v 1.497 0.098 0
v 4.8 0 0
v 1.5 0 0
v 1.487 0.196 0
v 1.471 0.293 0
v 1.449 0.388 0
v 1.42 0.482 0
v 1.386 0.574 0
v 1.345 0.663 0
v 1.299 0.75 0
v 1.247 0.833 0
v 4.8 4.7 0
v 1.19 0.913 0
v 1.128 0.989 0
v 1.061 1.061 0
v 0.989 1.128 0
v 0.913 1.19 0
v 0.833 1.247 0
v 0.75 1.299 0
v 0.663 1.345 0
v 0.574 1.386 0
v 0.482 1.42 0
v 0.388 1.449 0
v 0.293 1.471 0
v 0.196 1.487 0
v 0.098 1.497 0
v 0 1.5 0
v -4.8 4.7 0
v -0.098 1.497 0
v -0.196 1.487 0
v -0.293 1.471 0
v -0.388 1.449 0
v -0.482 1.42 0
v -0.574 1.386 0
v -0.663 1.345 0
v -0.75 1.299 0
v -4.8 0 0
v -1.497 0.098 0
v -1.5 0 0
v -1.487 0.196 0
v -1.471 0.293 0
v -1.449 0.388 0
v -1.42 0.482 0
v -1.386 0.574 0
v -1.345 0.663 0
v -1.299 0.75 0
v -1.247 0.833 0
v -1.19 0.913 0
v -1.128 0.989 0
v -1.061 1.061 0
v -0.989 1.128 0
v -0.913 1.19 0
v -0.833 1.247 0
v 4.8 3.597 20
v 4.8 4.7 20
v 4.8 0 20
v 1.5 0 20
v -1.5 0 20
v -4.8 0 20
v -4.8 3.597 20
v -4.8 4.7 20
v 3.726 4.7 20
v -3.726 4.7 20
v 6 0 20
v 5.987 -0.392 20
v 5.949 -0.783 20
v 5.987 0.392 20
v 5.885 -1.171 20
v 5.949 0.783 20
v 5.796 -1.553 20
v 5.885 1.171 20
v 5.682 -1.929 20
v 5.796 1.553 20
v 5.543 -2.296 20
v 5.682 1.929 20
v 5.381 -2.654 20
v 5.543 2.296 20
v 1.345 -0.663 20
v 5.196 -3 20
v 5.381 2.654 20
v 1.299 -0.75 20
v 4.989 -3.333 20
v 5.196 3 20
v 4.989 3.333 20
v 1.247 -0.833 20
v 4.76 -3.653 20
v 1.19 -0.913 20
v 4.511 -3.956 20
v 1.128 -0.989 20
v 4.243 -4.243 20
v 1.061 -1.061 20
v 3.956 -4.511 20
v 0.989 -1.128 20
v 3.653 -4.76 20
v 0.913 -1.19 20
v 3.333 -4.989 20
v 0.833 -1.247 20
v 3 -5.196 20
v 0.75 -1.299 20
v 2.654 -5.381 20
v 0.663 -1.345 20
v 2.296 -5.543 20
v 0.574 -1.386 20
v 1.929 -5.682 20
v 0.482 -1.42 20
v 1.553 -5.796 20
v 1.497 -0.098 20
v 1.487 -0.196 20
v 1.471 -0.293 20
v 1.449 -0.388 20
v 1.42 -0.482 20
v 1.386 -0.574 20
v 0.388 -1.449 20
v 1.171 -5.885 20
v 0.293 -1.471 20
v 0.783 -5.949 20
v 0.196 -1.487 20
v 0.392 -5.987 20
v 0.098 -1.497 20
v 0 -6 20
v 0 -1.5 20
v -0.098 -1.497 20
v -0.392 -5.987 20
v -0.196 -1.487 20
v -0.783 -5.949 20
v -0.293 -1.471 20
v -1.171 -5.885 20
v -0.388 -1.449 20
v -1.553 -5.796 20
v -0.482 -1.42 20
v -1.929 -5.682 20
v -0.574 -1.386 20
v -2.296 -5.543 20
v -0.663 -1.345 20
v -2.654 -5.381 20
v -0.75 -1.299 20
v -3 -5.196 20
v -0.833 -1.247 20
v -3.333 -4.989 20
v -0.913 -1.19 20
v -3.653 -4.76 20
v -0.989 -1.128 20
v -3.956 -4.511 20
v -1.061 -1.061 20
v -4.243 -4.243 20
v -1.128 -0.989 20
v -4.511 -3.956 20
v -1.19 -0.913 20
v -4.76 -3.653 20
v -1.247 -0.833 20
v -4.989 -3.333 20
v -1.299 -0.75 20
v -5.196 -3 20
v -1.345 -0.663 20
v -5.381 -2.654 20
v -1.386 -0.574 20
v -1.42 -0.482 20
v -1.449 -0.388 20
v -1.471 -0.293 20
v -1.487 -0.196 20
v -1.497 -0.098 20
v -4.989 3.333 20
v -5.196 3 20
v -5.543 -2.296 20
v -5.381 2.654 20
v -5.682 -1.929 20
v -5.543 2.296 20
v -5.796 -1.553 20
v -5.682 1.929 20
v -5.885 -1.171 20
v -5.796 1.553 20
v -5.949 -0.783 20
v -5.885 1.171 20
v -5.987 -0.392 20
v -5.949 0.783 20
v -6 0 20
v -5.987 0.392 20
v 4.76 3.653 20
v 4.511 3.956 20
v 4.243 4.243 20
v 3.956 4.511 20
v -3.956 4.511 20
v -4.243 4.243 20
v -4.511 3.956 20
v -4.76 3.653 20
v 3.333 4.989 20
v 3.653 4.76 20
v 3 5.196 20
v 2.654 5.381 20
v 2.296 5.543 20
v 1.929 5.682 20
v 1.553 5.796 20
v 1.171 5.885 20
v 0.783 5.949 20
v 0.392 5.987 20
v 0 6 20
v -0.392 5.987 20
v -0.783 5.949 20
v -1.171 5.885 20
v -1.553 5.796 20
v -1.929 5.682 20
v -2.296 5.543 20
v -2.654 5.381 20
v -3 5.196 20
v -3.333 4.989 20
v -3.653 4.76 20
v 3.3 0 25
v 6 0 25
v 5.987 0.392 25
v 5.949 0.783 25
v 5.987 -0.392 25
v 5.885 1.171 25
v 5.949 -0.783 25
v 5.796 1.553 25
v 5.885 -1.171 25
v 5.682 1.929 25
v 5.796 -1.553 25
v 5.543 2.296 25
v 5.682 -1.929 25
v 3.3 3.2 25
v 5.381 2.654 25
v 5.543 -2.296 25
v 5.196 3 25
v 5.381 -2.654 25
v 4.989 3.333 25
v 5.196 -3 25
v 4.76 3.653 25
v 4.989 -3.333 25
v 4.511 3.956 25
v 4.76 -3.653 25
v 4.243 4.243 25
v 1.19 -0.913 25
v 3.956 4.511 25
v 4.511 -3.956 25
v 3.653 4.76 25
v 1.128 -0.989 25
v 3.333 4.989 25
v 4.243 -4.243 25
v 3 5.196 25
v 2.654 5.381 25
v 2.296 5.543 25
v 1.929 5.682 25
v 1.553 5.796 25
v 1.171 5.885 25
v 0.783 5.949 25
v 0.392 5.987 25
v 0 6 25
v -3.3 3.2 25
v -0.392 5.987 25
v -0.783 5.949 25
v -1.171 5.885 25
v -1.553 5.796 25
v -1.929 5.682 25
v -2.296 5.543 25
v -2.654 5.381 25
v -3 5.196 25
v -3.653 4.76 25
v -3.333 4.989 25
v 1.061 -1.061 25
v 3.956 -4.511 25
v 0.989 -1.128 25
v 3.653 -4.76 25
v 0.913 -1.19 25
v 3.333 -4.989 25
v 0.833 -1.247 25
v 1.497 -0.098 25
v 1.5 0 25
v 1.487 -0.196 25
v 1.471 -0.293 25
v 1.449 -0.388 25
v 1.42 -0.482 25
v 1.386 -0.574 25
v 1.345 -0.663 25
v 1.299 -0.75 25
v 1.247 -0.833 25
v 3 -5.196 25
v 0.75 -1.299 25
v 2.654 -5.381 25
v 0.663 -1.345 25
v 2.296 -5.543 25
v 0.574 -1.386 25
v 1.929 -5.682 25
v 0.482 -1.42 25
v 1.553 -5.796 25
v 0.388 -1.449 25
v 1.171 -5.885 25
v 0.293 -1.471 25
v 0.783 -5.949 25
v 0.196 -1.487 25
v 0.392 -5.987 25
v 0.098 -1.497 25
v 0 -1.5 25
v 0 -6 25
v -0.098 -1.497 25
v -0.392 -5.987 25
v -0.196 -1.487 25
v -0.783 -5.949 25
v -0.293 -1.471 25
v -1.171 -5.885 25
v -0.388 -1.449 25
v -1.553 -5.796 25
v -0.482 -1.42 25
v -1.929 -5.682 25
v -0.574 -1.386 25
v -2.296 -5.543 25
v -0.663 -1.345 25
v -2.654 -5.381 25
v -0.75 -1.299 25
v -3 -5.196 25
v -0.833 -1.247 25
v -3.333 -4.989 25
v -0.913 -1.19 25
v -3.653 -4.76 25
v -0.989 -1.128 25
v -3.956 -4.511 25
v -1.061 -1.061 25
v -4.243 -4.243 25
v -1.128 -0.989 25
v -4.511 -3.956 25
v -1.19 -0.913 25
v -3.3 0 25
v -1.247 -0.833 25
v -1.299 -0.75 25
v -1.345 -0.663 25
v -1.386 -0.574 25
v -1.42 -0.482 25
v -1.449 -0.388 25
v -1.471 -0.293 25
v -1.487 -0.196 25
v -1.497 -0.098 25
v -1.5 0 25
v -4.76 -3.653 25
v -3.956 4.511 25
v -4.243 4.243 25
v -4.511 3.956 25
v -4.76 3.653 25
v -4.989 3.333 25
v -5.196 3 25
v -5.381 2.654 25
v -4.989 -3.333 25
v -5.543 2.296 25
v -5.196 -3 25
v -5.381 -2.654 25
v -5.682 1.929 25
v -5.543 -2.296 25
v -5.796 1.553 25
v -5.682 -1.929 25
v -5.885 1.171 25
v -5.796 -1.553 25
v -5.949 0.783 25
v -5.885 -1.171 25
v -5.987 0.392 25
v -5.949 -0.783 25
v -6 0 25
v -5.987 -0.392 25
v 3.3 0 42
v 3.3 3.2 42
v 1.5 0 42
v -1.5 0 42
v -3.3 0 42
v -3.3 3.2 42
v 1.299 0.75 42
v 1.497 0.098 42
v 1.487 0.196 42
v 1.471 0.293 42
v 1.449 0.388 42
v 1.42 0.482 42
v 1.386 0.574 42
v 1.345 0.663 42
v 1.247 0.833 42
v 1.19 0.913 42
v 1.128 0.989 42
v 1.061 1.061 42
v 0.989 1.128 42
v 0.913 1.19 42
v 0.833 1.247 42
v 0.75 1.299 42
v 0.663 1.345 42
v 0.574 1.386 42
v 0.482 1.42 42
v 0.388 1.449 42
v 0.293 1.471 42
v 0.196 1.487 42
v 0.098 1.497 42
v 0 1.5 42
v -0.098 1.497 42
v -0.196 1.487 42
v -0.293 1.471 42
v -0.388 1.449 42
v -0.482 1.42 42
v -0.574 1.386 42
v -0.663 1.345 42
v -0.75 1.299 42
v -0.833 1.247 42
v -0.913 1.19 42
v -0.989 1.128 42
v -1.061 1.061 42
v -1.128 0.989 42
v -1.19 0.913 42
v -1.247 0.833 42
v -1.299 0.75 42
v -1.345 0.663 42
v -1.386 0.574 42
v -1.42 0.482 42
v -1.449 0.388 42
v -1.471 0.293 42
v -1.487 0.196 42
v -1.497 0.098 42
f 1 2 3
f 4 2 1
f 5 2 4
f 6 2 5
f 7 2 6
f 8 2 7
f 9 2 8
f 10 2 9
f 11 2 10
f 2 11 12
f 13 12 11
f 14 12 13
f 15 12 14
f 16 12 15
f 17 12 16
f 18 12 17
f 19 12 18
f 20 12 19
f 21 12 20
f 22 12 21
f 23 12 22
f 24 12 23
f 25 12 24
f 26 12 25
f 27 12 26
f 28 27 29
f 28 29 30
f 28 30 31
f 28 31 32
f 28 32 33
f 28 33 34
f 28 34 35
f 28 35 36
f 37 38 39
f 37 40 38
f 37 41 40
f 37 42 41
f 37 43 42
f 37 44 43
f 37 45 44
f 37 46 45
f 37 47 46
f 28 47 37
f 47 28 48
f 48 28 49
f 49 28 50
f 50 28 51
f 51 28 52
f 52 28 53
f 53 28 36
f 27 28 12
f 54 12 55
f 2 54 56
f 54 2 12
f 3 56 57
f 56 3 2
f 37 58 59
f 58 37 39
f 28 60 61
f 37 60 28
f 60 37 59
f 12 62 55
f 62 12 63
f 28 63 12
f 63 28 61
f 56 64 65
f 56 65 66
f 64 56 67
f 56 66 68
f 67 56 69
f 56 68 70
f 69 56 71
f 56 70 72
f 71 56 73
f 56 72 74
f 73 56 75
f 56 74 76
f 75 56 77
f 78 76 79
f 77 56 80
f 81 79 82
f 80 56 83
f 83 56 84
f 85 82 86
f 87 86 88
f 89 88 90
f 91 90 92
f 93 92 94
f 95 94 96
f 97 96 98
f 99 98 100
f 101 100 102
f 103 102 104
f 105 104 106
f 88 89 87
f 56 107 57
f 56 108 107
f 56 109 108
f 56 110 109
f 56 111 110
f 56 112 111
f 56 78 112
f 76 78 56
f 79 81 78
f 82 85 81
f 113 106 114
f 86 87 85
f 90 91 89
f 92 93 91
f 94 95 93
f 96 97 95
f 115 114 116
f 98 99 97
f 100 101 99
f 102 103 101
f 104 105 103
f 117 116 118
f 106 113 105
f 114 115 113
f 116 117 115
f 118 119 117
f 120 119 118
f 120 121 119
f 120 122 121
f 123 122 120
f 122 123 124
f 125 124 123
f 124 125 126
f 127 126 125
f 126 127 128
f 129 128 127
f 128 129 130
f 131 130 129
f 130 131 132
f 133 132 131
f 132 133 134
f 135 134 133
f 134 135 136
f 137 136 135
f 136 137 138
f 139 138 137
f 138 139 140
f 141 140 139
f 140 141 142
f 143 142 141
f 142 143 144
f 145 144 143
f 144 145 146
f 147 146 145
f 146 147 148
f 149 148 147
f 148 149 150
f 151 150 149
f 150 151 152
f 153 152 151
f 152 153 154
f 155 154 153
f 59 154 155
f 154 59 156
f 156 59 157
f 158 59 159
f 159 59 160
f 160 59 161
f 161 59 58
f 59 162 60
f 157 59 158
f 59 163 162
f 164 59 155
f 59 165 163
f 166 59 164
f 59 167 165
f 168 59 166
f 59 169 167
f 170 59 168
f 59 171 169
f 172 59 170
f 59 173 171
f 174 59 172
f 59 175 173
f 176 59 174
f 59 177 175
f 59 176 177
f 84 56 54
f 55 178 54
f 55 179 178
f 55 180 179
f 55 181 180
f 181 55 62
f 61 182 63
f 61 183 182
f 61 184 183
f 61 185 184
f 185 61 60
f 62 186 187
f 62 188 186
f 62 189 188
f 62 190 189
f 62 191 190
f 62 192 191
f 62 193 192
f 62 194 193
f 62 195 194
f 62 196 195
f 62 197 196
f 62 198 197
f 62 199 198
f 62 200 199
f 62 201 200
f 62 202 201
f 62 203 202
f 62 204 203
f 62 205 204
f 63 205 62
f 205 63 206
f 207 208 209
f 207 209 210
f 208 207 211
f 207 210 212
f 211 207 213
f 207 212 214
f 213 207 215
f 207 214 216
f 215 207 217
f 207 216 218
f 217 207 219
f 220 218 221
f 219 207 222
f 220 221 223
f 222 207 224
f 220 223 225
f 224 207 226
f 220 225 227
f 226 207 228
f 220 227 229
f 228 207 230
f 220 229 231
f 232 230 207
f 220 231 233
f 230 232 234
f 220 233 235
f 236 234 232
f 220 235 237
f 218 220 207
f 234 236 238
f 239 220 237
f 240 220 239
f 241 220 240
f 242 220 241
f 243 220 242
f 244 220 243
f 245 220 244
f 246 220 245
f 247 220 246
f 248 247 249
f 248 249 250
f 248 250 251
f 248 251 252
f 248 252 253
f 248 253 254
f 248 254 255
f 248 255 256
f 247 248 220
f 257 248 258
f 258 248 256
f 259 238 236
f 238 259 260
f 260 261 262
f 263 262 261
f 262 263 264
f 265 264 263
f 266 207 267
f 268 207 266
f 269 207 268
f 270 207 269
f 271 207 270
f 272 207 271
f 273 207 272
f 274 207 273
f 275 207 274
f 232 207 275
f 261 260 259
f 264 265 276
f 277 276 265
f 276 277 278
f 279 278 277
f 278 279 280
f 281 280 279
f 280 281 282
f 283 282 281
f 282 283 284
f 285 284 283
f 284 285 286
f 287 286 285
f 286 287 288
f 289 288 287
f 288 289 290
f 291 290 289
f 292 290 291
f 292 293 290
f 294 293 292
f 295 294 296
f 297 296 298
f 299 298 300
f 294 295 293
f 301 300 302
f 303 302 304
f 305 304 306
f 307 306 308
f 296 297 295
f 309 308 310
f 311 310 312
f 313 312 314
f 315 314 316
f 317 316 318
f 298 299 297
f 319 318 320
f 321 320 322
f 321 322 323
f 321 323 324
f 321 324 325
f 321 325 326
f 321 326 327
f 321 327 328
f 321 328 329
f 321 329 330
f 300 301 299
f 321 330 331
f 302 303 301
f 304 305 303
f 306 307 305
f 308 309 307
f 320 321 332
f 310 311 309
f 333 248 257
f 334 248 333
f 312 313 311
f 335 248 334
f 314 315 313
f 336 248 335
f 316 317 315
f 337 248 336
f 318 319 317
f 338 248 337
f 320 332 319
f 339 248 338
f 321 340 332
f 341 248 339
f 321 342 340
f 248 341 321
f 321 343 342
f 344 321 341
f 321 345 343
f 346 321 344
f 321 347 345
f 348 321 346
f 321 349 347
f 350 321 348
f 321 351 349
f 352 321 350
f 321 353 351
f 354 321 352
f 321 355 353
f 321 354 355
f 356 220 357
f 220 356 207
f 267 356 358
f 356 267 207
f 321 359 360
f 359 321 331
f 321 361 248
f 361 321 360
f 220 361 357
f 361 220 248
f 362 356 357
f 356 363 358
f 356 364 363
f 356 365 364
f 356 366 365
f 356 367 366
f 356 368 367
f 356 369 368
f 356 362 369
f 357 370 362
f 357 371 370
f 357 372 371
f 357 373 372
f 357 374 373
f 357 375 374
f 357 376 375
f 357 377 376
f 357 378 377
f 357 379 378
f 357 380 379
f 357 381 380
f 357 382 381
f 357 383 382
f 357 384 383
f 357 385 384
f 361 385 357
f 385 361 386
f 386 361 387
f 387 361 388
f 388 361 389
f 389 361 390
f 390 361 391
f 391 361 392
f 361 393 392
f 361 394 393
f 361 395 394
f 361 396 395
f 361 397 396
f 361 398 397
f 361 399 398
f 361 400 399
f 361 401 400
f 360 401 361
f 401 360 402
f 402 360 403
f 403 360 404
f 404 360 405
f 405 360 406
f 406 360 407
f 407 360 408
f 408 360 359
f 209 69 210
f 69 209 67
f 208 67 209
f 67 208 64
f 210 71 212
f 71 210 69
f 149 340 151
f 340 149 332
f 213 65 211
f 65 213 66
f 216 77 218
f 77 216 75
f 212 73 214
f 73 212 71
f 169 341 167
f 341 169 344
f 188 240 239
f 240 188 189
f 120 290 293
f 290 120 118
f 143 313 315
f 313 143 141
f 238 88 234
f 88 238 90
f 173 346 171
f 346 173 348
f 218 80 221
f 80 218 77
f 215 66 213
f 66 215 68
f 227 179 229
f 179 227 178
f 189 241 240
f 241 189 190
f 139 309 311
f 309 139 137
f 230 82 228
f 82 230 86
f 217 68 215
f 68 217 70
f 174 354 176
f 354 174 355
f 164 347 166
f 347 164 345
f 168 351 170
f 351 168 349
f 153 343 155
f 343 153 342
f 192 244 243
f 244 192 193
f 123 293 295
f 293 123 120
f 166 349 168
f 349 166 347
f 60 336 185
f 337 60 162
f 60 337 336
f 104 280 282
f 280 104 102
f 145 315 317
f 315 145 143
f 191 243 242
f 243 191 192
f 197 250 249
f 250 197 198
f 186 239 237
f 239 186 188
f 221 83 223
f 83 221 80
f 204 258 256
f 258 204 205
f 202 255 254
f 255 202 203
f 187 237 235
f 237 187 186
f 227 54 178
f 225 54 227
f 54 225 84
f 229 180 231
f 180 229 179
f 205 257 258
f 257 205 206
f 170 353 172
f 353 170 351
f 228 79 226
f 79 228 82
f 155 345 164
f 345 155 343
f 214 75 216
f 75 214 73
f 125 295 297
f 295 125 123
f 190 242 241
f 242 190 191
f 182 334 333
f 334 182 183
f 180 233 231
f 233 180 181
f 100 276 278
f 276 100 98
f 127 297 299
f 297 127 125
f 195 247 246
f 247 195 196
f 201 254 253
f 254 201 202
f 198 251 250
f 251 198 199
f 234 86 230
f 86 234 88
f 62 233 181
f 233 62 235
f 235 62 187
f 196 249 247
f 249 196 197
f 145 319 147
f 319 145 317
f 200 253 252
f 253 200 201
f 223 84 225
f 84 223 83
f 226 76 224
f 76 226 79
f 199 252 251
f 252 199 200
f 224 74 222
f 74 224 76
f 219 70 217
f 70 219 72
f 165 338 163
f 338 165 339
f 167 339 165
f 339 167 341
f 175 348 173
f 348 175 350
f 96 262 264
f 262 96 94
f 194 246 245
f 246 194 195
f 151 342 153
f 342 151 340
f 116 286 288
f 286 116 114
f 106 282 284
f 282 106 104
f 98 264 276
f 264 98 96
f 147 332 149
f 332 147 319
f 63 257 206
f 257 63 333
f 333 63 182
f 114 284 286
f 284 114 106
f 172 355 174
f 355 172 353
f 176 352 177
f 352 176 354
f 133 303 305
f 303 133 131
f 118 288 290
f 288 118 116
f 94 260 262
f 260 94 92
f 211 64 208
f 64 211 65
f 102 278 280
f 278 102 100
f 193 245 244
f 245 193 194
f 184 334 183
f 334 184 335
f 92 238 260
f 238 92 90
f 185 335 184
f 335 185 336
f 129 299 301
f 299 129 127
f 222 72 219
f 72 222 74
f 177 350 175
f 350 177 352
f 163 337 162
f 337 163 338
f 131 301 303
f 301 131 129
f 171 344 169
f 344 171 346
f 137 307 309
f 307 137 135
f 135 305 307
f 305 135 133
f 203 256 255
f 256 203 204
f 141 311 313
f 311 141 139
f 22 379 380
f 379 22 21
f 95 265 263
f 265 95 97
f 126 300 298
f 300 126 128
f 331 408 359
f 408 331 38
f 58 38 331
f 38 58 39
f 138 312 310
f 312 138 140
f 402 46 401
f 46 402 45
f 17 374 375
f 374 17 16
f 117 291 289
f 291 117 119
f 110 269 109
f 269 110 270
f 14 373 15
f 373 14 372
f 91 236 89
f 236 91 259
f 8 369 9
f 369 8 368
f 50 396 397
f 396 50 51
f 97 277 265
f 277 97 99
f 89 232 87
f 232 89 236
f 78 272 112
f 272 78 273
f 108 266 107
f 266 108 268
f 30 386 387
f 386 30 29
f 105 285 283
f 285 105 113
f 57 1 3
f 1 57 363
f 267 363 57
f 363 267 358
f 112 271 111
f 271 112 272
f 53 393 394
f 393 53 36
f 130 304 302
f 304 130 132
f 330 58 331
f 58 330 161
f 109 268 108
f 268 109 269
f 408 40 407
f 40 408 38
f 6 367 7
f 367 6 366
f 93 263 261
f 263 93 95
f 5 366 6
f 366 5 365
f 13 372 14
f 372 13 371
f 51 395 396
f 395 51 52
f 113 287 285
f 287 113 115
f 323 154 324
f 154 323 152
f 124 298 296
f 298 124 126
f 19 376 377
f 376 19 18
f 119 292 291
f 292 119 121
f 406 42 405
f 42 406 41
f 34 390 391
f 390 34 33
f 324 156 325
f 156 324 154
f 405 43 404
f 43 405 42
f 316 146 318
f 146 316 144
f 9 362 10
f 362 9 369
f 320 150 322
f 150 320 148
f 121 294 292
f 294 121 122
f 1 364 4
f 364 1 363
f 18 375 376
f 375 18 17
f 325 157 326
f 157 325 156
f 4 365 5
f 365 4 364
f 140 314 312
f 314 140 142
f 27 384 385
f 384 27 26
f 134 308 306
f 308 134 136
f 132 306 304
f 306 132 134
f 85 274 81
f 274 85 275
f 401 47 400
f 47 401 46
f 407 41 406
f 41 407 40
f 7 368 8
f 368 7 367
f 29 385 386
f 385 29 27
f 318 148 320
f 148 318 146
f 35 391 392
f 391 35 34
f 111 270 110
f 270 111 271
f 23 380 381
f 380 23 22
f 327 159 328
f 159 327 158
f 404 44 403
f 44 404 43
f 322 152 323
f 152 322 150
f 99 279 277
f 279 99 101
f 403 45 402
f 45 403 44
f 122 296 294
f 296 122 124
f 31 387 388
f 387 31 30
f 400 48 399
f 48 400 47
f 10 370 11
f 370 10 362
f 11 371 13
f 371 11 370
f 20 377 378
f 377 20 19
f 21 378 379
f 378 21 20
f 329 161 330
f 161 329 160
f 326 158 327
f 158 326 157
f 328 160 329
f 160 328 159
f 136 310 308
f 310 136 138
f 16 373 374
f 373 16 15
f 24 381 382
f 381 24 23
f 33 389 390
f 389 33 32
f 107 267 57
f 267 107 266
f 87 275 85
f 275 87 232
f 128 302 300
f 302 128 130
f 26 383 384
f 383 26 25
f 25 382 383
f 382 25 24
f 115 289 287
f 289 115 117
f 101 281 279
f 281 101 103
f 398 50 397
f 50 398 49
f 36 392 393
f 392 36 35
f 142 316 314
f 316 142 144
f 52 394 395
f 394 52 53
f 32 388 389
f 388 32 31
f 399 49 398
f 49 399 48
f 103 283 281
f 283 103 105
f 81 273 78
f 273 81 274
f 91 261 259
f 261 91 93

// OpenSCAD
// Straight hose-barb reducer: 8 mm tubing (barbs) -> 5 mm tubing (barbs)
// Print orientation: standing upright along Z, centred on origin in X/Y

// ---------------- Parameters ----------------
tube_d1      = 8;    // inner diameter of the larger tubing
tube_d2      = 5;    // inner diameter of the smaller tubing
bore_d       = 3;    // through-bore diameter (full length)

z_barb1_h    = 20;   // height of the 8 mm barbs (z = 0 .. 20)
z_barb1_od0  = 7.5;  // outer diameter of 8 mm barbs at bottom
z_barb1_od1  = 9.5;  // outer diameter of 8 mm barbs at top

z_collar_h   = 5;    // height of the cylindrical collar (z = 20 .. 25)
z_collar_d   = 12;   // outer diameter of the collar

z_barb2_h    = 17;   // height of the 5 mm barbs (z = 25 .. 41)
z_barb2_od0  = 6.5;  // outer diameter of 5 mm barbs at bottom
z_barb2_od1  = 5.0;  // outer diameter of 5 mm barbs at top

eps          = 0.5;  // overshoot for clean boolean cuts
$fn          = 96;   // curve resolution

// ---------------- Derived ----------------
tube_r1 = tube_d1 / 2 + 0.8;  // 8 mm barb outer radius at 3 mm bore
tube_r2 = tube_d2 / 2 + 0.8;  // 5 mm barb outer radius at 3 mm bore
collar_r = z_collar_d / 2;

// ---------------- Model ----------------
difference() {
    union() {
        // 8 mm barbs: sawtooth profile, stacked (two identical)
        for (i = [0 : 1])
            translate([0, 0, i * z_barb1_h / 2])
                linear_extrude(height = z_barb1_h / 2)
                    polygon([
                        [-tube_r1, 0],
                        [ tube_r1, 0],
                        [ tube_r1, z_barb1_od1 - tube_r1],  // top outer corner
                        [-tube_r1, z_barb1_od1 - tube_r1]
                    ]);

        // Cylindrical collar (z = 20 .. 25)
        translate([0, 0, z_barb1_h])
            cylinder(h = z_collar_h, r = collar_r);

        // 5 mm barbs: tapered then stepped back out, stacked (two identical)
        for (i = [0 : 1])
            translate([0, 0, z_barb1_h + z_collar_h + i * z_barb2_h / 2])
                linear_extrude(height = z_barb2_h / 2)
                    polygon([
                        [-tube_r2, 0],
                        [ tube_r2, 0],
                        [ tube_r2, z_barb2_od0 - tube_r2],  // bottom outer corner
                        [ z_barb2_od1 - tube_r2, z_barb2_od0 - tube_r2],  // top outer corner
                        [-z_barb2_od1 + tube_r2, z_barb2_od0 - tube_r2],
                        [-tube_r2, z_barb2_od0 - tube_r2]
                    ]);
    }

    // Full-length 3 mm bore
    translate([0, 0, -eps])
        cylinder(h = z_barb1_h + z_collar_h + z_barb2_h + 2 * eps, d = bore_d);
}
